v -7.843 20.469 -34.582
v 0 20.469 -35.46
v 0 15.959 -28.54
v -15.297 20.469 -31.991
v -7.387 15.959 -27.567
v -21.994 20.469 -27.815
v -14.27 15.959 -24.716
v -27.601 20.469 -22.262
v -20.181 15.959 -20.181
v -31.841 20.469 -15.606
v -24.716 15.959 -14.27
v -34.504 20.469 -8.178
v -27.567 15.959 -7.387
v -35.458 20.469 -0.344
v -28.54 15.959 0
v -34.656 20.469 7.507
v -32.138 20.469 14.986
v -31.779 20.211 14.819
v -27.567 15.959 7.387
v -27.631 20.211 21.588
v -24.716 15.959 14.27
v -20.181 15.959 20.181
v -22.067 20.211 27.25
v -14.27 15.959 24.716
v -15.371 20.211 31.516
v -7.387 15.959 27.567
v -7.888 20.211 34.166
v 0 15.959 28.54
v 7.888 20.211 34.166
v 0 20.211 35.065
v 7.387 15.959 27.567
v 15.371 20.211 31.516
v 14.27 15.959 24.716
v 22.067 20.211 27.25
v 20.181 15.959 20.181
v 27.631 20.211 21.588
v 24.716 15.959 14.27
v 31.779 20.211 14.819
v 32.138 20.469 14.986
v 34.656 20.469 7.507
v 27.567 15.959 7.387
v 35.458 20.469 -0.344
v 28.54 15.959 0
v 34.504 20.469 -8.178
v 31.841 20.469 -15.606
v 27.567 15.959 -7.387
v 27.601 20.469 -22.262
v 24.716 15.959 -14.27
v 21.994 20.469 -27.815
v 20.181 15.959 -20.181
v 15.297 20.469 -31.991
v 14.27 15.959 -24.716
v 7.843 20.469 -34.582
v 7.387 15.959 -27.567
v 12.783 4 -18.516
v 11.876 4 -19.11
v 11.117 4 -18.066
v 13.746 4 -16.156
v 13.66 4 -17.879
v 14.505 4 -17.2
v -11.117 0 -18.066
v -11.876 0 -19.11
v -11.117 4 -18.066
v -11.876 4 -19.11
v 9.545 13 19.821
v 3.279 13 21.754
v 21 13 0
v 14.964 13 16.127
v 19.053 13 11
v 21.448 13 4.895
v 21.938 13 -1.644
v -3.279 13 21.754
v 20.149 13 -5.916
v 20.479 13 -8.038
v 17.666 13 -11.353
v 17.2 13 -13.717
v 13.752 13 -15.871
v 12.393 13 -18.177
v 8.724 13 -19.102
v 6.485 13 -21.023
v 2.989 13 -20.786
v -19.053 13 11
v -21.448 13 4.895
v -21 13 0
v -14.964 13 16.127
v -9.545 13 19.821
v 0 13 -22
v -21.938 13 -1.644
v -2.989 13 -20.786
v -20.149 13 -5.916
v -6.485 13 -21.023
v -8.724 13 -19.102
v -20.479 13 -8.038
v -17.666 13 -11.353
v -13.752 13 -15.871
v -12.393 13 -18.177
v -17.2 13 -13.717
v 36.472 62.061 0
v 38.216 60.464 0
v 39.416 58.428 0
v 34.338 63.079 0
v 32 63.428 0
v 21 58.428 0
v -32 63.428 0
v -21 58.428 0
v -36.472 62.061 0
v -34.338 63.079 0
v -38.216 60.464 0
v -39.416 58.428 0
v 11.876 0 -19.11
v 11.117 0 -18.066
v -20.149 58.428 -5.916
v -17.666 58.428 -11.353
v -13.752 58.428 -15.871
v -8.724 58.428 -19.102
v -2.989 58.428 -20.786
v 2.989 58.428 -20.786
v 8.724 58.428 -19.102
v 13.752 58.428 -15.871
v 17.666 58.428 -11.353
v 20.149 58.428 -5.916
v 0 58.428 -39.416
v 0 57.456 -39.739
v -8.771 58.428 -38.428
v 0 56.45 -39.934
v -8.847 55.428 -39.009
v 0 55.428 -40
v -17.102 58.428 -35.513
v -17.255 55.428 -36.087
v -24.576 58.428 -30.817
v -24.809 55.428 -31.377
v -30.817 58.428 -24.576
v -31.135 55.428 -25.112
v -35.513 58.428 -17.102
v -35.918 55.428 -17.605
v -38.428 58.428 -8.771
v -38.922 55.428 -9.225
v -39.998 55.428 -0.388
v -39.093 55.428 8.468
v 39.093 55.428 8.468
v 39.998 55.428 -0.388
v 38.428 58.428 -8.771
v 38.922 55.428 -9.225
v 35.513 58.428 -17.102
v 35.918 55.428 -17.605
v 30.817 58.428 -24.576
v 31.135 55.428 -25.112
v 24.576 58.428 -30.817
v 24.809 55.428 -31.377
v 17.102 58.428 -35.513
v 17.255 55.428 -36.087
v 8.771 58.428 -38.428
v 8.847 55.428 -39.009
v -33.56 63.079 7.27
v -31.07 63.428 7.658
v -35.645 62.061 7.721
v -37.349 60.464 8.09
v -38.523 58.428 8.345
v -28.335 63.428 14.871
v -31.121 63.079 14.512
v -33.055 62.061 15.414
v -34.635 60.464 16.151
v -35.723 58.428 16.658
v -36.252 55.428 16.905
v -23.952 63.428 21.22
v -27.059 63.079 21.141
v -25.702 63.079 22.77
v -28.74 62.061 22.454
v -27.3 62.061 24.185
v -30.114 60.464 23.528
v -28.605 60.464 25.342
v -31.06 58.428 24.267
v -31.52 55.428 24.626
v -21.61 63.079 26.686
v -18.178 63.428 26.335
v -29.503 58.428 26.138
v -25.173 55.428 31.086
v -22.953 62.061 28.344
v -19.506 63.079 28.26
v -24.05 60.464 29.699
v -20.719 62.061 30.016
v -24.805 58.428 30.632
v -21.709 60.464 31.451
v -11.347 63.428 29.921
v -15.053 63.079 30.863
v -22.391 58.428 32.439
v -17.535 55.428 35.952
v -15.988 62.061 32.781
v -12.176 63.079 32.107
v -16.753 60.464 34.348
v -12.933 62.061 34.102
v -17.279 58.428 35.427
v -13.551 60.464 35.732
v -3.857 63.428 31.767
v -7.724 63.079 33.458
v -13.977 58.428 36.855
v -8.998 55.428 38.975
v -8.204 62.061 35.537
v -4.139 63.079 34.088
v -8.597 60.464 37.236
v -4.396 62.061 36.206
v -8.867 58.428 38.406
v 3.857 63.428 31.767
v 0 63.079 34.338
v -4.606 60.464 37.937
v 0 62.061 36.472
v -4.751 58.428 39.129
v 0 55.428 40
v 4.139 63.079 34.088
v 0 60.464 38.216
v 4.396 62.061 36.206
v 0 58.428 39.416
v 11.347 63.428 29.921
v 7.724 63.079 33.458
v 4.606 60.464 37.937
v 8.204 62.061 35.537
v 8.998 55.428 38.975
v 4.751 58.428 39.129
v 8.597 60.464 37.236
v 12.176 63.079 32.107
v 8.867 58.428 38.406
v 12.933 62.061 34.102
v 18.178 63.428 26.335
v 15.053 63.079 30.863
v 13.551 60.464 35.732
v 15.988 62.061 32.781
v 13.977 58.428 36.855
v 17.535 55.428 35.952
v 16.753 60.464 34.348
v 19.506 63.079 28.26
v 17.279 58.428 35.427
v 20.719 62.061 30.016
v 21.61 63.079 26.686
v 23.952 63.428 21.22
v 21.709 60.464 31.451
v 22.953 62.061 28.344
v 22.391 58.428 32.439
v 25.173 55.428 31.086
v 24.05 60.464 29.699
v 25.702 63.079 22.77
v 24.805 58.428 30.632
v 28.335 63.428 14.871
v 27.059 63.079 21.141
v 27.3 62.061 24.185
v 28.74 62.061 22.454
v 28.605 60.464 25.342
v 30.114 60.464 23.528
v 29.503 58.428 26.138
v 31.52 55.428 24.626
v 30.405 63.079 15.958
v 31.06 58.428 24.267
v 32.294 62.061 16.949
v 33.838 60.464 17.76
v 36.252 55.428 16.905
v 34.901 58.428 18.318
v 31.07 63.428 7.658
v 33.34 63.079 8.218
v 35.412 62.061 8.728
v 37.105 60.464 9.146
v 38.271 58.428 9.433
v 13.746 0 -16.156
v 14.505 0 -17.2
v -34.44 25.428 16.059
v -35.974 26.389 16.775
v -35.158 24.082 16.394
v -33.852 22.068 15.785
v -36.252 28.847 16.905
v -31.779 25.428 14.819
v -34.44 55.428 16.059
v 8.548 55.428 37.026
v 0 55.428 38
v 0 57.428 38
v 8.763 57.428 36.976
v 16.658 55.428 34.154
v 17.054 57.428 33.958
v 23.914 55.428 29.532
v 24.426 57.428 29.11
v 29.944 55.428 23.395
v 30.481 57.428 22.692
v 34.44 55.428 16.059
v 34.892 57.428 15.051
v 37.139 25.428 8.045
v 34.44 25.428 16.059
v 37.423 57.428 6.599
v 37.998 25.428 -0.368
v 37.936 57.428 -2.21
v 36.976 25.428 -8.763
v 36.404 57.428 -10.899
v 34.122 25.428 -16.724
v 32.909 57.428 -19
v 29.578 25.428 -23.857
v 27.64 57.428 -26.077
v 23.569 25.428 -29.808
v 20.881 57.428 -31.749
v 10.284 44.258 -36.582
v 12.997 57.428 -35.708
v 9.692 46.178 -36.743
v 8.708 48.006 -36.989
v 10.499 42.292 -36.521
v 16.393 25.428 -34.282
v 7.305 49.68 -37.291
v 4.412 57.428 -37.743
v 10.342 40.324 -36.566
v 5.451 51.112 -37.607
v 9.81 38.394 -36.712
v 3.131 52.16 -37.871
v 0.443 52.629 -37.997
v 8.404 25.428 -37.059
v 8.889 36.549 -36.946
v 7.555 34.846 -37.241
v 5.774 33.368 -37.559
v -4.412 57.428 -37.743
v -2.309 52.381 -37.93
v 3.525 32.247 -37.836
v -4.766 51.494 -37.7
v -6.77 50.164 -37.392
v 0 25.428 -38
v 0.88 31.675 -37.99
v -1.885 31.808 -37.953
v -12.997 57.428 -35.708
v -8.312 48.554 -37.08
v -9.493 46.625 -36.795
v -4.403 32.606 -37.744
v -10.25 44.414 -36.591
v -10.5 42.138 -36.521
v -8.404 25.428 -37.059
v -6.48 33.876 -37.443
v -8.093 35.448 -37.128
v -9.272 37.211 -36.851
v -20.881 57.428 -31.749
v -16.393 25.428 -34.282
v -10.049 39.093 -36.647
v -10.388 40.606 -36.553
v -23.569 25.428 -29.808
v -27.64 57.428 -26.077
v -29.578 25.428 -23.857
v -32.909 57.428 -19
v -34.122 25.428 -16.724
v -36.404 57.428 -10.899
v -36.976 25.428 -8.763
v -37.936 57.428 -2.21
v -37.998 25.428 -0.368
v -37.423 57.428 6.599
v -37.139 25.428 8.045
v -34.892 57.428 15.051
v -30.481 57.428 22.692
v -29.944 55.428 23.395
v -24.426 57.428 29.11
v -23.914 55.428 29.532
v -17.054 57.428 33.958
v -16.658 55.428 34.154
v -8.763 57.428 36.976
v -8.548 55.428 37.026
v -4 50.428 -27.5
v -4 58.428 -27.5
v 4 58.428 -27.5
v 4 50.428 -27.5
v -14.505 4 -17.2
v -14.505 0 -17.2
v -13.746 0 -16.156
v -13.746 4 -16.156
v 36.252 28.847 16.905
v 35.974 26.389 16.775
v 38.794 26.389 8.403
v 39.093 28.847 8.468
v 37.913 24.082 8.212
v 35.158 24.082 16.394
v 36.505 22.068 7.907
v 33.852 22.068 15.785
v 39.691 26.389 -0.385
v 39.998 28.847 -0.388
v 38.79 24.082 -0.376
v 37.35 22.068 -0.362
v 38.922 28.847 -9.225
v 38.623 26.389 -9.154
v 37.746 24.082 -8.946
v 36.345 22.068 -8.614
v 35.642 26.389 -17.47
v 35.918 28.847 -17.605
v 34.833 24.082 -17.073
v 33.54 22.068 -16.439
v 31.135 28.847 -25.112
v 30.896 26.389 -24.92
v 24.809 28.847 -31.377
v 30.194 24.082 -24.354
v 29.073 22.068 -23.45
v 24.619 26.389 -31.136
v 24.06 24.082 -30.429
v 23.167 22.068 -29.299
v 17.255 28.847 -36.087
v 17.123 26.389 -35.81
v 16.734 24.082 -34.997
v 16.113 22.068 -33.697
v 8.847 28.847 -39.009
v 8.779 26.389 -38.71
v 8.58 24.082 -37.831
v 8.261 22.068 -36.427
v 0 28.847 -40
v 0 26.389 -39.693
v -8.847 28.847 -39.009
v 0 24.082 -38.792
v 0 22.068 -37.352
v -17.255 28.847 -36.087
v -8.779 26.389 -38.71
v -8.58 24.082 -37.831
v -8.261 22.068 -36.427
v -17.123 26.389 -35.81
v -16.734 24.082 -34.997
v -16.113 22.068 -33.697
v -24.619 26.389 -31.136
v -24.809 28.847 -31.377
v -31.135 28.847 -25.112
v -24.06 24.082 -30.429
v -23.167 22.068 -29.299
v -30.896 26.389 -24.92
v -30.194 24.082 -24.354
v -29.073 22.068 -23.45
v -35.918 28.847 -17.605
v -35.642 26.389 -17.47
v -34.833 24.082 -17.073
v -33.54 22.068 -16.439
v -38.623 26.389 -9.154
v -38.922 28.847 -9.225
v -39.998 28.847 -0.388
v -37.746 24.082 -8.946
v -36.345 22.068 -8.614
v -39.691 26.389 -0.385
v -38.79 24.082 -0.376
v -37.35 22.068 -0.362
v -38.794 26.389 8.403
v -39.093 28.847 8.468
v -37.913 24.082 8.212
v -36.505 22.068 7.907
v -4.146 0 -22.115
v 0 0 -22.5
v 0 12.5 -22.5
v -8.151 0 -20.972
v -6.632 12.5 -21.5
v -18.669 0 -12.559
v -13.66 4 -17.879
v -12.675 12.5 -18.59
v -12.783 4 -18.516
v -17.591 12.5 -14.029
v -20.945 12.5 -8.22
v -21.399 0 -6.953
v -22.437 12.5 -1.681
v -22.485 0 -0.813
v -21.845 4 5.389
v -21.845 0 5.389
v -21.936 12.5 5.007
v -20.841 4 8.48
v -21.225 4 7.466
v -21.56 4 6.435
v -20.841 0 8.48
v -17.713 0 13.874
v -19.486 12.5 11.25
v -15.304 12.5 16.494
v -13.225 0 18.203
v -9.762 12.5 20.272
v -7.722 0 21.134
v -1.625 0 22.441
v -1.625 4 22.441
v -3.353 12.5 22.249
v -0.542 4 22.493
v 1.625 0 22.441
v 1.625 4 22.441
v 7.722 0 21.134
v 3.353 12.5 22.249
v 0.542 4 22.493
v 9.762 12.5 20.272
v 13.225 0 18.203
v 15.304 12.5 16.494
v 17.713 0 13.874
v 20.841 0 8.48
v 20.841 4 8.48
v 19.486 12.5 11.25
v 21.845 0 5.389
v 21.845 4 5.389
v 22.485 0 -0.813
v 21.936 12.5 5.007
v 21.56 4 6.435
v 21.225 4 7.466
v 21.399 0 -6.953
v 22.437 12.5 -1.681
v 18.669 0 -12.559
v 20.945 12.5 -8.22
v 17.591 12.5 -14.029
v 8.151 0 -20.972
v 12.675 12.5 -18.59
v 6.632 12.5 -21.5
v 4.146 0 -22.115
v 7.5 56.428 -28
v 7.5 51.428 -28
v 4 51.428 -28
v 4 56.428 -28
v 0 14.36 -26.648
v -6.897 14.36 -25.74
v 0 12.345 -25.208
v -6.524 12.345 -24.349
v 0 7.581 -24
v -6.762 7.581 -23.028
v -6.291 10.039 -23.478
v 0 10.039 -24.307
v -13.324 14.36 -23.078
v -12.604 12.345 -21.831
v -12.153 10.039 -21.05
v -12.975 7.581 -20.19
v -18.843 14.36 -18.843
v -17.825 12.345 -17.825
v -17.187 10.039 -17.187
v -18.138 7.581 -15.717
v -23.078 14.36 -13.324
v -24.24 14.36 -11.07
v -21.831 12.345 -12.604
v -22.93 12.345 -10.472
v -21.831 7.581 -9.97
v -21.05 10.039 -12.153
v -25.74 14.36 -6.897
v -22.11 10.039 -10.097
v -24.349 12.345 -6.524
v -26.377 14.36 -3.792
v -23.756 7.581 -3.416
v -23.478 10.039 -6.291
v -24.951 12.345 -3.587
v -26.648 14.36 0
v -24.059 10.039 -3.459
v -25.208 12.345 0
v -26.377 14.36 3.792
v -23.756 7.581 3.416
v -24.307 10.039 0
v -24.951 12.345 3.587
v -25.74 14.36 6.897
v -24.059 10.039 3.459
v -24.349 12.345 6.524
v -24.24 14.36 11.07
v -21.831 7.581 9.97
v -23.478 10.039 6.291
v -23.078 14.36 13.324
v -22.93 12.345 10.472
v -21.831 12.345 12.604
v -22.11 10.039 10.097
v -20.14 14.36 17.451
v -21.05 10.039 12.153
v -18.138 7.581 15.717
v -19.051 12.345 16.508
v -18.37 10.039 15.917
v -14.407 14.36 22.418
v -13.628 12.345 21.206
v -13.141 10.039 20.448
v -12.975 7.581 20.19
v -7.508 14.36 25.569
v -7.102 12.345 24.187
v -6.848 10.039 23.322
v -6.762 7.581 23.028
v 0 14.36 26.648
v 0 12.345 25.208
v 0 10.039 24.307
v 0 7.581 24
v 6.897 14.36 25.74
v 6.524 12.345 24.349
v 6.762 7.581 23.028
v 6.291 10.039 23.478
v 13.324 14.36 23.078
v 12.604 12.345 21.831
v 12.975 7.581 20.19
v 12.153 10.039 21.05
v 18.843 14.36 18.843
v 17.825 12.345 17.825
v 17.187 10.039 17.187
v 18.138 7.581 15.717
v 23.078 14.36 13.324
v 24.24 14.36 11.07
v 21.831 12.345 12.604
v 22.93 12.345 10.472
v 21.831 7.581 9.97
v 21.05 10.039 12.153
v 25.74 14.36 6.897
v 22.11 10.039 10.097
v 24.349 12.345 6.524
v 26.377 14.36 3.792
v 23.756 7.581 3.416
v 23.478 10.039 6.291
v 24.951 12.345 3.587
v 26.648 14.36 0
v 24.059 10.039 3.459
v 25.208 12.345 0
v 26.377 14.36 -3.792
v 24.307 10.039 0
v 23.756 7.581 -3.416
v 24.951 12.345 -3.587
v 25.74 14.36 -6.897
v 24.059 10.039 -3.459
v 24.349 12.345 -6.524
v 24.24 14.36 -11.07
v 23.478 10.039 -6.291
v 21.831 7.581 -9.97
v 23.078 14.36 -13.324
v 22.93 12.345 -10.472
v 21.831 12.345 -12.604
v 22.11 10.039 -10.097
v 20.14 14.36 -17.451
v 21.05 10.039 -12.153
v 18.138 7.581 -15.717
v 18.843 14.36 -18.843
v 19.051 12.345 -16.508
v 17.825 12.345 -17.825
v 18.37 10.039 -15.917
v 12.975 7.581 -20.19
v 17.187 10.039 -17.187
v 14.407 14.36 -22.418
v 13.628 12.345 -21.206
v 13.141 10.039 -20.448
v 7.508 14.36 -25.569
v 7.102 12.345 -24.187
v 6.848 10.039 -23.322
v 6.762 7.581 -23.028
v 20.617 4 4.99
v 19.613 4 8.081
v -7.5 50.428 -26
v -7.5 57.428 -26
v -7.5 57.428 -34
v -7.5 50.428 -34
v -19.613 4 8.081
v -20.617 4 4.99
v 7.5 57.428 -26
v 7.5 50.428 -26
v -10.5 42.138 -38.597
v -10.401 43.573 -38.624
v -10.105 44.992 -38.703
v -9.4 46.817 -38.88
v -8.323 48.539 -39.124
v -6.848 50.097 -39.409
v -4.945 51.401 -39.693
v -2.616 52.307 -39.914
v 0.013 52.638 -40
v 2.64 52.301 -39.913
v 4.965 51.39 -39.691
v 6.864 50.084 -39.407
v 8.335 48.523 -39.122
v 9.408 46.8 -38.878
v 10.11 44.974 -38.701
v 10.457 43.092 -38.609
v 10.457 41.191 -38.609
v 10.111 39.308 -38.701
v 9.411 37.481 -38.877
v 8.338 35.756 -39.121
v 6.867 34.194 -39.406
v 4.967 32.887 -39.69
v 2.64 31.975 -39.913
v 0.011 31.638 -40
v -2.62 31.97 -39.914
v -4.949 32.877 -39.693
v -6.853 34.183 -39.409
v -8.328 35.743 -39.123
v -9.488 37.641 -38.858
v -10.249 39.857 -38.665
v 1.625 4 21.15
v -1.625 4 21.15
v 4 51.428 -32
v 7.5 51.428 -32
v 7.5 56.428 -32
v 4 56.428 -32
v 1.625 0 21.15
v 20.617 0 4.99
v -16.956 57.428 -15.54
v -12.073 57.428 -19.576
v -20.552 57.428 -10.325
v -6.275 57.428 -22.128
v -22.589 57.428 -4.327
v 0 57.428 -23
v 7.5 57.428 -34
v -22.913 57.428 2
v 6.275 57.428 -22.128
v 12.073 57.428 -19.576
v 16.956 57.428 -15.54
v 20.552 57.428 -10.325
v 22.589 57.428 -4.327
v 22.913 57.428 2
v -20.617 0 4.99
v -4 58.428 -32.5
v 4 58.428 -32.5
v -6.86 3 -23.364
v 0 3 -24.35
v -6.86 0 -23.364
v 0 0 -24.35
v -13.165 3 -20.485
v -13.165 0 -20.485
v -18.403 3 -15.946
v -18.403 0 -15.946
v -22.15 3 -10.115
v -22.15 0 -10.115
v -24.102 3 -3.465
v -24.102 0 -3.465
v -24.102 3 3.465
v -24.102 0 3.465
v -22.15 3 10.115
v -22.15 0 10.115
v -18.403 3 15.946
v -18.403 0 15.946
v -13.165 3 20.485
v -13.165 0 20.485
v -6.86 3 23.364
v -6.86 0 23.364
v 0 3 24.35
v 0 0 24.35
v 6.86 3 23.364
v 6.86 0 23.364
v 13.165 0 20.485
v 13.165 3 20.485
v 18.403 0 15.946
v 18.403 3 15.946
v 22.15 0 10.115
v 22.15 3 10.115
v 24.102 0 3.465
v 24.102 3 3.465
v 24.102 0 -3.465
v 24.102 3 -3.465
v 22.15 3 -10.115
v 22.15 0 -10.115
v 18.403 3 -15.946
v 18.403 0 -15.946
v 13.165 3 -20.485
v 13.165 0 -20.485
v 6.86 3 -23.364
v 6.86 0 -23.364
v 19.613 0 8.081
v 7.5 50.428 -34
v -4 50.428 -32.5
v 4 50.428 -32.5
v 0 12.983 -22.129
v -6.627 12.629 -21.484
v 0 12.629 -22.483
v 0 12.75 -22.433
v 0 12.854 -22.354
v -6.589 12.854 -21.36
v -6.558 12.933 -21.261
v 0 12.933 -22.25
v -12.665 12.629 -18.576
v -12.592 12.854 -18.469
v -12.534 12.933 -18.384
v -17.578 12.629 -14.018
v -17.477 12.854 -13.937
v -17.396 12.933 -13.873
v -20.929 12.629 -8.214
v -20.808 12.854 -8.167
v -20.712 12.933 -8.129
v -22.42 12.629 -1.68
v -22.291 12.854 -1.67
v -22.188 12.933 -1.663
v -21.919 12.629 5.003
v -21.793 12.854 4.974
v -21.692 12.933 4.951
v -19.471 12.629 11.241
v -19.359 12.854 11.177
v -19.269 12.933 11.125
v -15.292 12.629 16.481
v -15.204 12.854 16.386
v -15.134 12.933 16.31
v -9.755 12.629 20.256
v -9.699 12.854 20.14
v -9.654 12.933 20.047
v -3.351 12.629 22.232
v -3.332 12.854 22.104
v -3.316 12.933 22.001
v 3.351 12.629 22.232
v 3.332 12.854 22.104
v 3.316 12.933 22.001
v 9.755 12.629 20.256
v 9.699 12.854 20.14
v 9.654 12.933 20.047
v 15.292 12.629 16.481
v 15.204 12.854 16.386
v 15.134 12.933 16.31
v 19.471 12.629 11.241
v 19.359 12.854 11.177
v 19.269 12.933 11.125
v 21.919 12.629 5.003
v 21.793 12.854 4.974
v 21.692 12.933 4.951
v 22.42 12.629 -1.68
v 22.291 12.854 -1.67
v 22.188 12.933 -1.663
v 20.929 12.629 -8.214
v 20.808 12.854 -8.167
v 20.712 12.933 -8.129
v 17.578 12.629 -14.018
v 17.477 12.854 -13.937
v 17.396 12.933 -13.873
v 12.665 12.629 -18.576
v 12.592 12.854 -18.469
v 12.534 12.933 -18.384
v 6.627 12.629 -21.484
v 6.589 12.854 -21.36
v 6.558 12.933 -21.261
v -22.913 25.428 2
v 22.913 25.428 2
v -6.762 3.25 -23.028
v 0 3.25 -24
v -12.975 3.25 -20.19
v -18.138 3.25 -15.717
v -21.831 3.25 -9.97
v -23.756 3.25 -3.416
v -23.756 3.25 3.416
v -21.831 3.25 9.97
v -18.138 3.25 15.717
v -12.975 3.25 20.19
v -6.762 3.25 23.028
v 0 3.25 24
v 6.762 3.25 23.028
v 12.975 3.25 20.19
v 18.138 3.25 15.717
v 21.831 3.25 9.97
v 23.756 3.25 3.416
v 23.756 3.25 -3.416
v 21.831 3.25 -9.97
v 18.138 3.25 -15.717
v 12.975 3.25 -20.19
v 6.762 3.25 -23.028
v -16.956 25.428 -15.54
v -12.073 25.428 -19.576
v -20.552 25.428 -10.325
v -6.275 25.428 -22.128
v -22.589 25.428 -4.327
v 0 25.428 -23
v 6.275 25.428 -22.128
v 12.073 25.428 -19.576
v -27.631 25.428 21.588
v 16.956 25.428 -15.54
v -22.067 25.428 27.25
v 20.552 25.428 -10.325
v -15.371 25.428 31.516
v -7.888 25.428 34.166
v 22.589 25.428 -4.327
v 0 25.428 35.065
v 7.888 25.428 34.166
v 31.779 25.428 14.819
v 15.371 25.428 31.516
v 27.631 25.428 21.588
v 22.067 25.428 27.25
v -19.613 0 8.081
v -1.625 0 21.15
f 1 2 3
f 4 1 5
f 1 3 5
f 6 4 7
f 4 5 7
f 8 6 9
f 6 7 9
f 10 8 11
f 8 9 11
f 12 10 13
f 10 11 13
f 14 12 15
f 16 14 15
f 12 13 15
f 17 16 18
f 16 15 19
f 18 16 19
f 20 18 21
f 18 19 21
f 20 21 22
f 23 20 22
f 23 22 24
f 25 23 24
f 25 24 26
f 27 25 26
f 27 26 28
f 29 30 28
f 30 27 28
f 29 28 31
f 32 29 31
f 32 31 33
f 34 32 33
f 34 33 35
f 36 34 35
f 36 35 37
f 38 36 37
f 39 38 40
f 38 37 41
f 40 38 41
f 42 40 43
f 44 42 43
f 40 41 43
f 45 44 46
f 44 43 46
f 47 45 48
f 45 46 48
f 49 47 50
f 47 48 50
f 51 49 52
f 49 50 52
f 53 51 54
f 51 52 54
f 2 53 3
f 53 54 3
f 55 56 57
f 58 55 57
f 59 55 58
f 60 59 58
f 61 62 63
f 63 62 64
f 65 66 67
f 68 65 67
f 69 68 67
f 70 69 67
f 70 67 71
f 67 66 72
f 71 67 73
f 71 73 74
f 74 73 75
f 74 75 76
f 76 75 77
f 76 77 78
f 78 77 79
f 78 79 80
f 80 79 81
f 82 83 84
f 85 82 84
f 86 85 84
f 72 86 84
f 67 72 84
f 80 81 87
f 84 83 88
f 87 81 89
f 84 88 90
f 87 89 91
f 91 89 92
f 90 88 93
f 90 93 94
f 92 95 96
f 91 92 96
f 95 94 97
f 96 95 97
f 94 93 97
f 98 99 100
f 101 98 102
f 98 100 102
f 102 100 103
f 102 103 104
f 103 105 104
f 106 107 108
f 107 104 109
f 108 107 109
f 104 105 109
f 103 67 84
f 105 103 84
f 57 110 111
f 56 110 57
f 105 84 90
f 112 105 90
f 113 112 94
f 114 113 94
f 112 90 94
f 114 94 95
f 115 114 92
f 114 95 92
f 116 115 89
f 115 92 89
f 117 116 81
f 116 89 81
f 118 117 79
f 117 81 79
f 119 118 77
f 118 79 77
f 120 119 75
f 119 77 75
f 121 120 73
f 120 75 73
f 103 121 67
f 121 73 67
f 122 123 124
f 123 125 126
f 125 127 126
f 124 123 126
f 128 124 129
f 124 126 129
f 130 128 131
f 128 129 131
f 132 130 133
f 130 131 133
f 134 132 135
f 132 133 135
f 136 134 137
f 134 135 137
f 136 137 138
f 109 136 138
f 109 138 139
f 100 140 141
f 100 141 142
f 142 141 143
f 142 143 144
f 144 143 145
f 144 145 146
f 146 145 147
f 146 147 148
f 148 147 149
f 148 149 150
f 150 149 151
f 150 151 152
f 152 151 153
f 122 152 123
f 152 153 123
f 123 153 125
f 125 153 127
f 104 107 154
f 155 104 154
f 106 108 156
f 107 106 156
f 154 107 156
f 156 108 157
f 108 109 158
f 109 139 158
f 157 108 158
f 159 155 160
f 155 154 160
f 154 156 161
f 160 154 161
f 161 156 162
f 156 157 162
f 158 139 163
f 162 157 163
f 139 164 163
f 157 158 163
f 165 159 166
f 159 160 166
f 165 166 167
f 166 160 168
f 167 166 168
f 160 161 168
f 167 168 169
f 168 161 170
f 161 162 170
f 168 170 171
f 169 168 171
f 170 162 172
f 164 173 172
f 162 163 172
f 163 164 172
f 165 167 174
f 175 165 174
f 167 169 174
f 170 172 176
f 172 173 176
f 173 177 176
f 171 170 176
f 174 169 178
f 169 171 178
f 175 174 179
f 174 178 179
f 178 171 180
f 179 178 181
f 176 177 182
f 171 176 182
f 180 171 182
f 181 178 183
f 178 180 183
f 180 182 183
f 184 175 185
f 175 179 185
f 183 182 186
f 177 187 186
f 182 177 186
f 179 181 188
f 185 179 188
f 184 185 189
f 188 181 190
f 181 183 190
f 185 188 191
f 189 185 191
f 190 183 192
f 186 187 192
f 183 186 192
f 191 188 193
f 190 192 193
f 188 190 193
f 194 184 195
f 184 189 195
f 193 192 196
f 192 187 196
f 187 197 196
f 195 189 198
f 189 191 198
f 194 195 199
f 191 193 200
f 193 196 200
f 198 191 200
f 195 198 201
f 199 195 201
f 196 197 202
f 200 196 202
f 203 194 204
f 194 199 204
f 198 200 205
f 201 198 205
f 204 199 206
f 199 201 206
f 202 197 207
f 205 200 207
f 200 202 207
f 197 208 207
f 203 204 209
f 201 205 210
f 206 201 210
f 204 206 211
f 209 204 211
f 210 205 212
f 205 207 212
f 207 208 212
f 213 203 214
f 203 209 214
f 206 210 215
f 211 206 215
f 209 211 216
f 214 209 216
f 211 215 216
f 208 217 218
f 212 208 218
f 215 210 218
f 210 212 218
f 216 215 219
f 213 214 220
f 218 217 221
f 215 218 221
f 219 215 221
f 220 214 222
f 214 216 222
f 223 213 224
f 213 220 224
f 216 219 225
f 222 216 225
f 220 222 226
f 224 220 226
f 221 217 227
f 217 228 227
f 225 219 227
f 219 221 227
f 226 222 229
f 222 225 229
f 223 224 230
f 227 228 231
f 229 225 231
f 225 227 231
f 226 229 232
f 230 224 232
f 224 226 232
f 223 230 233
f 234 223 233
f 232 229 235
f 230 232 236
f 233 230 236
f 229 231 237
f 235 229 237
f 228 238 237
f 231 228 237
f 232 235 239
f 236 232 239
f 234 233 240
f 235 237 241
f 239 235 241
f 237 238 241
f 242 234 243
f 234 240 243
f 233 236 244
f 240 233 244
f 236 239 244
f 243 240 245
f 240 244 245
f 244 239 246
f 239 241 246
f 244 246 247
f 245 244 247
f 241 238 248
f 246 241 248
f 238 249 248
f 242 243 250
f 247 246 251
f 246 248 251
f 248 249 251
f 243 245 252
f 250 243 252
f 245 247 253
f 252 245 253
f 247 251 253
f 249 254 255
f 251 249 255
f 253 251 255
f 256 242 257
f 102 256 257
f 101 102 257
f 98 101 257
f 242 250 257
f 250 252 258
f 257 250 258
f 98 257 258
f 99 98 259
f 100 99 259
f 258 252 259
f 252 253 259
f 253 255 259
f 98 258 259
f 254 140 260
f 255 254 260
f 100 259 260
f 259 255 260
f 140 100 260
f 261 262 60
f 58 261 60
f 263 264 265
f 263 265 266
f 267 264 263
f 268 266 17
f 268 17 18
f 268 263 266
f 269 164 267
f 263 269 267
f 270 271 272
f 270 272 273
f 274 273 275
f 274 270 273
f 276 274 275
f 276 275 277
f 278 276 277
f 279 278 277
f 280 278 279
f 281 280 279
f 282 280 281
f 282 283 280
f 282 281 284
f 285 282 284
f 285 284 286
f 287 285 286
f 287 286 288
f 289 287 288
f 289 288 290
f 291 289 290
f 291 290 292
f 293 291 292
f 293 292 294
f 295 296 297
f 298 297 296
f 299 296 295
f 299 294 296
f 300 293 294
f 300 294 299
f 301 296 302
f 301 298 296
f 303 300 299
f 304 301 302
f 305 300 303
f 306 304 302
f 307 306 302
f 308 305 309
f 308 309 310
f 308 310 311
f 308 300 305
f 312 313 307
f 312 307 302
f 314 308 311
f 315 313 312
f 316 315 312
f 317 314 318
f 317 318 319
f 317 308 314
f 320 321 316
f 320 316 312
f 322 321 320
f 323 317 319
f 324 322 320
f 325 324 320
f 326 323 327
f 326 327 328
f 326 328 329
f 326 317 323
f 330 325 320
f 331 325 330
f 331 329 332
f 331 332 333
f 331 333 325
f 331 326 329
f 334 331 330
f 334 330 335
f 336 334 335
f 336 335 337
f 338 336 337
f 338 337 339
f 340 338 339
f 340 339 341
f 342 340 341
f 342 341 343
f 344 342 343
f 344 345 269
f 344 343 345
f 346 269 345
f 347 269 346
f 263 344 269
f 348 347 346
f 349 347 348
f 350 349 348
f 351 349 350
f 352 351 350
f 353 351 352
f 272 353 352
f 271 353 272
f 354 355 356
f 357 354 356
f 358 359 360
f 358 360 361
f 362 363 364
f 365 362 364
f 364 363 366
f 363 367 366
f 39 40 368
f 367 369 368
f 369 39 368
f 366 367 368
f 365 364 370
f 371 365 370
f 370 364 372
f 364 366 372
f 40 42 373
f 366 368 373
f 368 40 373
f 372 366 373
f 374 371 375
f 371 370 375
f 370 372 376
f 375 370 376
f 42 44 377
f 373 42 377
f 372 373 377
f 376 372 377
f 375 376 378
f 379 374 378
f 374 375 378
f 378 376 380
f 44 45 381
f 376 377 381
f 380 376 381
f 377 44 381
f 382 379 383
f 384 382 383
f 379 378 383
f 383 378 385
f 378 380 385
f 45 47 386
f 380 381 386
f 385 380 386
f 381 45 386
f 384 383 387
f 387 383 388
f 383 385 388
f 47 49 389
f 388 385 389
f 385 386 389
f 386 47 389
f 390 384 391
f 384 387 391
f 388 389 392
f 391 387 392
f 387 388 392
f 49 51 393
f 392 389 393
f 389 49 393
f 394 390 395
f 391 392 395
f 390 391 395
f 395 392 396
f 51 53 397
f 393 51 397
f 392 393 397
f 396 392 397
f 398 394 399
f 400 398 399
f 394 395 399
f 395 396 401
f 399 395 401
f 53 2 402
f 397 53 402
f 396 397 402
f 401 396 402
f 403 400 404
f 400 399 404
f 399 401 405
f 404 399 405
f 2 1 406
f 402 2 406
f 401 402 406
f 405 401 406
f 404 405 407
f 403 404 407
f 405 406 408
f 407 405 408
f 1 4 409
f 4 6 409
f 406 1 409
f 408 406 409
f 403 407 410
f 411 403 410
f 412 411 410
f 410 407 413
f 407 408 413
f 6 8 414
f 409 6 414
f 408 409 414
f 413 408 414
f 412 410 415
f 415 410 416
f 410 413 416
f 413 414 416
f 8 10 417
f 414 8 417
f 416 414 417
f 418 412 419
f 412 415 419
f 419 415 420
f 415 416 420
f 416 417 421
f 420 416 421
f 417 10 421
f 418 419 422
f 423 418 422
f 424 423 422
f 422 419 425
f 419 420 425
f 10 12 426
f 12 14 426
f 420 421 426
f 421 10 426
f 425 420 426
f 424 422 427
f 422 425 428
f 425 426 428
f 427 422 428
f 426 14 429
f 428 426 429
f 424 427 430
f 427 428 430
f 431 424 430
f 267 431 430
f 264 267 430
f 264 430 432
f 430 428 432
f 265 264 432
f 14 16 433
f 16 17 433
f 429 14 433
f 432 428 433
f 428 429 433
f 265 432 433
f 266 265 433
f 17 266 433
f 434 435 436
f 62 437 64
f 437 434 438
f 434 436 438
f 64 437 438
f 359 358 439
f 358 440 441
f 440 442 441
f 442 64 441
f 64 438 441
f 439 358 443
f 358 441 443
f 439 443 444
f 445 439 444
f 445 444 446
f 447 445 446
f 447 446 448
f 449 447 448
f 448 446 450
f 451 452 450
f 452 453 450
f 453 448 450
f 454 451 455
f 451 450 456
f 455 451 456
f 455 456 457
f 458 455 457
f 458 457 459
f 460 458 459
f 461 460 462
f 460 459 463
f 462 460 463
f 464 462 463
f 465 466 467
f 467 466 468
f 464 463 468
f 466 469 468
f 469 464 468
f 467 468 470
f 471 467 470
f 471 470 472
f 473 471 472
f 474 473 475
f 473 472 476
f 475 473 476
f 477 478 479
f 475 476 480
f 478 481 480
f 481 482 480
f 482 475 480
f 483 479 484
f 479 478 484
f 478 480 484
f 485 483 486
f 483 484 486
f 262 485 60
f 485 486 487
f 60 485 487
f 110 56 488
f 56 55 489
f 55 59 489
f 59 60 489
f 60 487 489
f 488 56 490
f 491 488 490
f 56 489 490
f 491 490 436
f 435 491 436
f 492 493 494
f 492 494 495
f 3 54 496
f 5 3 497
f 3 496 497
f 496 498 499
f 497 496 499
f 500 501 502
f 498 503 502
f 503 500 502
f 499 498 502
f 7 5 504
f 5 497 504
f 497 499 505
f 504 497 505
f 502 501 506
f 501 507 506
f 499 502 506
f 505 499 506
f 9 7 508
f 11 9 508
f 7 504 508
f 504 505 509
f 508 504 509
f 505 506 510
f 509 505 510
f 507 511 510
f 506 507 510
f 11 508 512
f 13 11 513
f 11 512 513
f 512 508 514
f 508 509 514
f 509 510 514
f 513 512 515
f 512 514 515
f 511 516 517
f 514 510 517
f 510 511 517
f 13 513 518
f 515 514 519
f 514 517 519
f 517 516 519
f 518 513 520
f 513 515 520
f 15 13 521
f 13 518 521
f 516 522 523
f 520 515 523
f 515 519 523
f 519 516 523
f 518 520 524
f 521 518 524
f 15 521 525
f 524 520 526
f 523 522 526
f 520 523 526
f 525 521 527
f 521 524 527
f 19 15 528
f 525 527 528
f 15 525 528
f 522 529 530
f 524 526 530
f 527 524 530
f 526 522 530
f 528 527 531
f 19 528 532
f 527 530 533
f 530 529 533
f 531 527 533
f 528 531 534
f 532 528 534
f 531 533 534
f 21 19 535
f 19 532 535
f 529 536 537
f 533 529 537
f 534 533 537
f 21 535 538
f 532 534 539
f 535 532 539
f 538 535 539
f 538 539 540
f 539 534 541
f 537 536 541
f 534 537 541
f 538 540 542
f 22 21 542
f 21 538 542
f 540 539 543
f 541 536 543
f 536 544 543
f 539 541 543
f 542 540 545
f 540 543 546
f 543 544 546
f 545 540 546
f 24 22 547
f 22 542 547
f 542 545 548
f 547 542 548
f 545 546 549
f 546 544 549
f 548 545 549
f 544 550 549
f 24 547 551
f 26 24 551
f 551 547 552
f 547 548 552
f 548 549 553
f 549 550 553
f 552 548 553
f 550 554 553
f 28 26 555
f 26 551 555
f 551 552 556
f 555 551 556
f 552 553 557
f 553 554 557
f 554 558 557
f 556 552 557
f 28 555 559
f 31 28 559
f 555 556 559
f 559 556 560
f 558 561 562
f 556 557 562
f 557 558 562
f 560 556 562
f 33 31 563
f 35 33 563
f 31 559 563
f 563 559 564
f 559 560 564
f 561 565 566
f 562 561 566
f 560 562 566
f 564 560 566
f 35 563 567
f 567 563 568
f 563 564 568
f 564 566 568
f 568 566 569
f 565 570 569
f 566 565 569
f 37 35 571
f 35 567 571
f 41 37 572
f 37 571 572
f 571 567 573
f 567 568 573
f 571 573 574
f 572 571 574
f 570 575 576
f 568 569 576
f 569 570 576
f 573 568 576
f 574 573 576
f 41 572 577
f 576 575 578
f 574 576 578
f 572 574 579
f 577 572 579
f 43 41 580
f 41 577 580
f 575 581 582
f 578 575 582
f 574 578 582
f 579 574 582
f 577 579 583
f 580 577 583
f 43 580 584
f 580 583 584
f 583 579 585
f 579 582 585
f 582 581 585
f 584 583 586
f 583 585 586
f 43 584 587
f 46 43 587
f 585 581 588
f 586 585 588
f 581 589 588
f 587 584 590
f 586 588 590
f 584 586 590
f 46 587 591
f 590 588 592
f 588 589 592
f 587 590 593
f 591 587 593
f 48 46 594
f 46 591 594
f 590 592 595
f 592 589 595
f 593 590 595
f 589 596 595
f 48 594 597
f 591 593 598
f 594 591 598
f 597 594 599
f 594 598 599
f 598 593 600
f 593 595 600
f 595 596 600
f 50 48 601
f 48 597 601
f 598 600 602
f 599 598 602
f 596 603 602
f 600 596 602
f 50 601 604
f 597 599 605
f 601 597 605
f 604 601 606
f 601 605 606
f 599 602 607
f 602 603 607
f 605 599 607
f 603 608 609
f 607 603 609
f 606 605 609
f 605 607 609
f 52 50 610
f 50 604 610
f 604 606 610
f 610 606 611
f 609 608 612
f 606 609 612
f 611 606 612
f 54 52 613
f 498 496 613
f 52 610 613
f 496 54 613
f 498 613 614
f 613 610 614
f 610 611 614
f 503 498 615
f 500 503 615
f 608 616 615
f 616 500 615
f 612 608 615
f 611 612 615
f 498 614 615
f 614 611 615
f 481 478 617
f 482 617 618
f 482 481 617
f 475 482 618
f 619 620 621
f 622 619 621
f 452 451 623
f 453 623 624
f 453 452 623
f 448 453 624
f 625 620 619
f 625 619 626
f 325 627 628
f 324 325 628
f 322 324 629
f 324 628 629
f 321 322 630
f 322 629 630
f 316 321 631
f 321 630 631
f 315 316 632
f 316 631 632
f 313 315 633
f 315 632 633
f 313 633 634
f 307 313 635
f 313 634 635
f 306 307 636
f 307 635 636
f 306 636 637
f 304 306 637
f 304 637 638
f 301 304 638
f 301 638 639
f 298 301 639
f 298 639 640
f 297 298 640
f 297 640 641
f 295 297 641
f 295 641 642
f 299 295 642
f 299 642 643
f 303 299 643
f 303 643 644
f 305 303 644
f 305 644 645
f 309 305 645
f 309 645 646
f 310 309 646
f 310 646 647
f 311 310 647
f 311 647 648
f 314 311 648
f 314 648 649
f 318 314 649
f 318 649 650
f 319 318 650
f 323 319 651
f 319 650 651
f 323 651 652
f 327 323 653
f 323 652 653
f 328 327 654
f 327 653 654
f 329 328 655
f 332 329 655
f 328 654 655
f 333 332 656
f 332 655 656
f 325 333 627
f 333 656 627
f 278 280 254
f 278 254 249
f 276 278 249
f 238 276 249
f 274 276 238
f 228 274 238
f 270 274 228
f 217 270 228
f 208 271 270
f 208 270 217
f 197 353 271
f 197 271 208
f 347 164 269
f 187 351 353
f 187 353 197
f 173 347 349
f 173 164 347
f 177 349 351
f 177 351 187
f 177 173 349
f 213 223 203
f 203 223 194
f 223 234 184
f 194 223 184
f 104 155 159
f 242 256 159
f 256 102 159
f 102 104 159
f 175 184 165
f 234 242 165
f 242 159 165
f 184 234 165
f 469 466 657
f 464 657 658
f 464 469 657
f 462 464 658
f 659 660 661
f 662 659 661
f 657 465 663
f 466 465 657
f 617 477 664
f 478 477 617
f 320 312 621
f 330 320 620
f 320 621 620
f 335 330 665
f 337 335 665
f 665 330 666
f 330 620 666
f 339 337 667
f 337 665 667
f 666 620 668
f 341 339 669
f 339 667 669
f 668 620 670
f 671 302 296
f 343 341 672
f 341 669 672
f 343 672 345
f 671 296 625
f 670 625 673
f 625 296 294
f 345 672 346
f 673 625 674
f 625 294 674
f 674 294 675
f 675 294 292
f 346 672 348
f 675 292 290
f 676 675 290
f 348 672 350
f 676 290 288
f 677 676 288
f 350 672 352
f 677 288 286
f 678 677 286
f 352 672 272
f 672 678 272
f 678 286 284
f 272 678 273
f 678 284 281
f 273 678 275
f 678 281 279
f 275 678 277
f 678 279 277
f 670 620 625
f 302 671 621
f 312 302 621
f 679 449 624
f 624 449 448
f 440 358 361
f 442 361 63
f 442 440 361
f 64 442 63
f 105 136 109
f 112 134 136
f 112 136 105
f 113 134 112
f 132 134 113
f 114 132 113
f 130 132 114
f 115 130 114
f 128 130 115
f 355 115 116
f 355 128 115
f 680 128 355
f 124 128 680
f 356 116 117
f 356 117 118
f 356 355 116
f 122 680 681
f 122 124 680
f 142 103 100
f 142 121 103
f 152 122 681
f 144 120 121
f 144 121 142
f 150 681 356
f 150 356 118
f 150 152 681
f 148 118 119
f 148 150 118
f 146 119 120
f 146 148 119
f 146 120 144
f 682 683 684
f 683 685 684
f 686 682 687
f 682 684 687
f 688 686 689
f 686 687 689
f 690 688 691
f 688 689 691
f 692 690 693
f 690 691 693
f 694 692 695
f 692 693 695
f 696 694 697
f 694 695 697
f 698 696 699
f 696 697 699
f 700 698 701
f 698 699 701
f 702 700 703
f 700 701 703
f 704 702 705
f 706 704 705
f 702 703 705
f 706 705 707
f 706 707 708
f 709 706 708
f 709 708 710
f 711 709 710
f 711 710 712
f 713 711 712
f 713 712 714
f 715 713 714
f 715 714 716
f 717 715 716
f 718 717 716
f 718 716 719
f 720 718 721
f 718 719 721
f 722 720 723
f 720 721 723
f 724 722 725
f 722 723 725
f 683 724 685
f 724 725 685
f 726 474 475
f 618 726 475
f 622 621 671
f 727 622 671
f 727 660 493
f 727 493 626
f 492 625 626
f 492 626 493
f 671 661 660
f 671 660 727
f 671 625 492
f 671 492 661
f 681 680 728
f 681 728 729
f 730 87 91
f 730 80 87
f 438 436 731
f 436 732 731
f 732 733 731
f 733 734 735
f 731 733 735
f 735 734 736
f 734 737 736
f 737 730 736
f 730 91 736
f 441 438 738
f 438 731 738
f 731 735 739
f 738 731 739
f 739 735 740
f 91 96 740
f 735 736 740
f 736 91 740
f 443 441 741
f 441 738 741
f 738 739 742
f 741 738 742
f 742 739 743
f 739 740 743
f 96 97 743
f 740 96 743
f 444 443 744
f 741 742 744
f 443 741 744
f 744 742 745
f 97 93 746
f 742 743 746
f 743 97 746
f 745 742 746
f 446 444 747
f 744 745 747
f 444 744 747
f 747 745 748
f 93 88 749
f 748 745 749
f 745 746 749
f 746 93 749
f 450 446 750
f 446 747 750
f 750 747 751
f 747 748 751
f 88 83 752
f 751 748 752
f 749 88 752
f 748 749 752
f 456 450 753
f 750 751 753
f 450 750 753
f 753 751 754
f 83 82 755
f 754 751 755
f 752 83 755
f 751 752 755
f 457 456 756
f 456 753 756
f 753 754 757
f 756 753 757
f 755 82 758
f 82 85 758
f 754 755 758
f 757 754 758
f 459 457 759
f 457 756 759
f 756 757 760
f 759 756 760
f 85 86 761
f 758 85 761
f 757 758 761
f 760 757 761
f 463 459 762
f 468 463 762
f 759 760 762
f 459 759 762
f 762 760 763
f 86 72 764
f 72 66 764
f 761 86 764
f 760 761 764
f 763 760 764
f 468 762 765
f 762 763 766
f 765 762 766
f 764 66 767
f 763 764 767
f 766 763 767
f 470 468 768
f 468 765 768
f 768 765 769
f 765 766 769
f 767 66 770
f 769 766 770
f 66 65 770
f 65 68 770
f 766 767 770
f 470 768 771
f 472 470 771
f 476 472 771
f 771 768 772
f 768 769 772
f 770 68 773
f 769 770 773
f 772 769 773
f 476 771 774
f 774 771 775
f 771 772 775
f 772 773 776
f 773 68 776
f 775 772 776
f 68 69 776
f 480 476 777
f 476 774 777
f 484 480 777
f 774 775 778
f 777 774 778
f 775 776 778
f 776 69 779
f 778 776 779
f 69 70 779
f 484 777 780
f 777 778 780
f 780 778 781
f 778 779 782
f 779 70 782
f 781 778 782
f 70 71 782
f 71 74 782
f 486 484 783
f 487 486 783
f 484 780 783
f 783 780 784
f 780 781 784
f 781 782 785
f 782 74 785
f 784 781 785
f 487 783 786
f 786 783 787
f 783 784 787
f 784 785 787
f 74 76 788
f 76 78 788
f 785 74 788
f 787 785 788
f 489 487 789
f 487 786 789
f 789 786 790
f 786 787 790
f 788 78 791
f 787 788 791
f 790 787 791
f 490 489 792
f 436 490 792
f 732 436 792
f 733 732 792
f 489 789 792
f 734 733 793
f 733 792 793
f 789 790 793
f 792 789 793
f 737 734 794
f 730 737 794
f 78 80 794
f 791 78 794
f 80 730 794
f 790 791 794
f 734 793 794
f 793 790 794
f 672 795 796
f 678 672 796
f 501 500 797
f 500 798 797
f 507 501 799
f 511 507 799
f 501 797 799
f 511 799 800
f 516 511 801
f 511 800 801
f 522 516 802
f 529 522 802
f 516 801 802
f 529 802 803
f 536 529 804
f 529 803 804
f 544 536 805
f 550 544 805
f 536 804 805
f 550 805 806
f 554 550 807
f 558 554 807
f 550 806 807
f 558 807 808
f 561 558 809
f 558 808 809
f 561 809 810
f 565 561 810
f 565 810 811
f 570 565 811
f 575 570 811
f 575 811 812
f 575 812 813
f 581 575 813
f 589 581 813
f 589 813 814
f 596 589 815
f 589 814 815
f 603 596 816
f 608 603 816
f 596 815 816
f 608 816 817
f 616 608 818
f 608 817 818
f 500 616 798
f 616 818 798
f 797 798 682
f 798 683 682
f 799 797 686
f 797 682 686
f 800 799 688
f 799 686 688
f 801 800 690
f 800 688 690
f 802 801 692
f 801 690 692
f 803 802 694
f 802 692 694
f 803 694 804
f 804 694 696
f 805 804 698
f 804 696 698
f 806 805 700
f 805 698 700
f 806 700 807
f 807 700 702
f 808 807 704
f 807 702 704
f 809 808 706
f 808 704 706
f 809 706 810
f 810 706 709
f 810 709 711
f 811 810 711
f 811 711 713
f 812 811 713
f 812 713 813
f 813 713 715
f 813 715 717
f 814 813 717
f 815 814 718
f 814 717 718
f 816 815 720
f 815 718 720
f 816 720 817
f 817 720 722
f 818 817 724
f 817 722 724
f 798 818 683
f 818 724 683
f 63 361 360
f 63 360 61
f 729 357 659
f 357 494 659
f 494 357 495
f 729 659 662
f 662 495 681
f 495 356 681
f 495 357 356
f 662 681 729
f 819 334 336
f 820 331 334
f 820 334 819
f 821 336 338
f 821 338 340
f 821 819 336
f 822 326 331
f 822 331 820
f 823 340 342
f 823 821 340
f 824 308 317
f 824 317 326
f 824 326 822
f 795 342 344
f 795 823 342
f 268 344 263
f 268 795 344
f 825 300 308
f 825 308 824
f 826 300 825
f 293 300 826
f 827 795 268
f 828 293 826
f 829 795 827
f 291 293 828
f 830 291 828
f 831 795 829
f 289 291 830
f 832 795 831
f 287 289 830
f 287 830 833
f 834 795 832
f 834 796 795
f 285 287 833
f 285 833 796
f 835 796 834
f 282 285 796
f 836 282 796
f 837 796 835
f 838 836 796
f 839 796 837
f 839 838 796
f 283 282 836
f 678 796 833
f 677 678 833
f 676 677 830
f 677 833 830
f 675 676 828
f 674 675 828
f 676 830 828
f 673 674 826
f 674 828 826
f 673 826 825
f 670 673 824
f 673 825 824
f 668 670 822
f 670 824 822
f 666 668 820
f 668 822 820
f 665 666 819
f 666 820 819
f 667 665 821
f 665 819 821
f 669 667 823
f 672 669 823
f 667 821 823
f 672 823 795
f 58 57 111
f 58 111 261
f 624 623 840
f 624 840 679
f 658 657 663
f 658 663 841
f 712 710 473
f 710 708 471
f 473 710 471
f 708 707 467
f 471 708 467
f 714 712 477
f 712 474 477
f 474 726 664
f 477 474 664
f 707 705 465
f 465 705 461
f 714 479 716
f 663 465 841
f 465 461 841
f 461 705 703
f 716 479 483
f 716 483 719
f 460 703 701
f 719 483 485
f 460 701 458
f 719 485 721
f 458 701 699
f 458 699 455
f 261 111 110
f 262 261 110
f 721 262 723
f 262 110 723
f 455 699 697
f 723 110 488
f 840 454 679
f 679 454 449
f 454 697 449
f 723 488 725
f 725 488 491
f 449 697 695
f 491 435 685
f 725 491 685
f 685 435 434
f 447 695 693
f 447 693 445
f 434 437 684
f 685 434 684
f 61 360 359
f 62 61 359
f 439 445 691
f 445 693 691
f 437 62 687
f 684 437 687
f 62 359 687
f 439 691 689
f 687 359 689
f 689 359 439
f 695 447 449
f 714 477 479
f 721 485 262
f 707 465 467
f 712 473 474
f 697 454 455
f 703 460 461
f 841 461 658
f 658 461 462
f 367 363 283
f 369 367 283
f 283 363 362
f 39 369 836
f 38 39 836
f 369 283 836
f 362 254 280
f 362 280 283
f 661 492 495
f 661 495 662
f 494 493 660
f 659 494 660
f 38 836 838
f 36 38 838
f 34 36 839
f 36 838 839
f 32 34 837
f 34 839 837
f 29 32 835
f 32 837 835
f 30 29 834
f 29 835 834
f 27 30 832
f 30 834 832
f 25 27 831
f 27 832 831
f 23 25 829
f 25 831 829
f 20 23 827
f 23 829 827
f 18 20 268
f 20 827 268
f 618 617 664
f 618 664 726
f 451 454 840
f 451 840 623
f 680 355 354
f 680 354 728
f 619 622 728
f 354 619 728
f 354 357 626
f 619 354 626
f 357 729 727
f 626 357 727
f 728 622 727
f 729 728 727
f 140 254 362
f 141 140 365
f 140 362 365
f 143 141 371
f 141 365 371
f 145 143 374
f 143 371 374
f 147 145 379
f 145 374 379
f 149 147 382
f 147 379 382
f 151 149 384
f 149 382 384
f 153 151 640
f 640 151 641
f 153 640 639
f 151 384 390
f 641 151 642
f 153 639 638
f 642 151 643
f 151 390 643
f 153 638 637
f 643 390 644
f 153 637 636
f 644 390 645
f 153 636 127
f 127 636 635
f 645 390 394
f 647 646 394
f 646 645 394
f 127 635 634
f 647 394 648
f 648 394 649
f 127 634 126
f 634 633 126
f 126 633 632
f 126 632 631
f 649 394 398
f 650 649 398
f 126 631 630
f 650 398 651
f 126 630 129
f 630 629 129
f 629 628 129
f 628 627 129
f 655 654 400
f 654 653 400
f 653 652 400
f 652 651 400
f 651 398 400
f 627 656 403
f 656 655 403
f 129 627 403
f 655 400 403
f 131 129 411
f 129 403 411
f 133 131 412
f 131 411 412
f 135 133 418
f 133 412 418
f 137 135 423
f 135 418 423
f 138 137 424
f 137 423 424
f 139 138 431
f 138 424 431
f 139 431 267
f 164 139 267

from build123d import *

# Parameters (mm, degrees)
CUT_EXTRUDE3_DEPTH           = 60
CUT_EXTRUDE5_DEPTH           = 2
CUT_EXTRUDE5_DEPTH_BACK      = 30
SKETCH9_R                    = 38
SKETCH9_R_2                  = 23
SKETCH19_W                   = 12
SKETCH19_H                   = 36.5
CUT_REVOLVE2_ANGLE           = 65
CUT_REVOLVE2_OTHER_WAY_ANGLE = 65
SKETCH21_W                   = 3.25
SKETCH21_H                   = 4
BOSS_EXTRUDE3_DEPTH          = 1.35
CIRPATTERN1_COUNT            = 5
CUT_EXTRUDE9_START           = -5
CUT_EXTRUDE9_DEPTH           = 5
SKETCH23_R                   = 10.5
CUT_EXTRUDE10_DEPTH          = 10
SKETCH24_W                   = 15
SKETCH24_H                   = 8
BOSS_EXTRUDE4_DEPTH          = 8
SKETCH26_W                   = 8
SKETCH26_H                   = 5
CUT_EXTRUDE11_DEPTH          = 10
SKETCH27_W                   = 4
SKETCH27_H                   = 5
CUT_EXTRUDE12_DEPTH          = 5
CUT_EXTRUDE14_DEPTH          = 2
CUT_EXTRUDE14_DEPTH_BACK     = 30


with BuildPart() as part:
    # Sketch1 → Revolve1 (revolve)
    with BuildSketch(Plane.XY):
        with BuildLine():
            Line((0, 63.427876097), (32, 63.427876097))
            ThreePointArc((32, 63.427876097), (37.656854249, 61.084730346), (40, 55.427876097))
            Line((40, 55.427876097), (40, 28.846818009))
            ThreePointArc((40, 28.846818009), (38.792081772, 24.082439968), (35.460140376, 20.469057744))
            Line((35.460140376, 20.469057744), (28.539859624, 15.958818353))
            ThreePointArc((28.539859624, 15.958818353), (25.207918228, 12.345436129), (24, 7.581058088))
            Line((24, 7.581058088), (24, 3.25))
            Line((24, 3.25), (24.35, 3))
            Line((24.35, 3), (24.35, 0))
            Line((24.35, 0), (22.5, 0))
            Line((22.5, 0), (22.5, 12.5))
            ThreePointArc((22.5, 12.5), (22.353553391, 12.853553391), (22, 13))
            Line((22, 13), (0, 13))
            Line((0, 13), (0, 63.427876097))
        make_face()
    revolve(axis=Axis((0, 0, 0), (0, 1, 0)))

    # Sketch11 → Cut-Extrude3 (cut)
    with BuildSketch(Plane(origin=(0, 13, 0), x_dir=(-1, 0, 0), z_dir=(0, -1, 0))):
        with BuildLine():
            Line((-21, 0), (21, 0))
            ThreePointArc((21, 0), (0, 21), (-21, 0))
        make_face()
    extrude(amount=-CUT_EXTRUDE3_DEPTH, mode=Mode.SUBTRACT)

    # Sketch9 → Cut-Extrude5 (cut, two sides: drawn at the far end of the back side and taken through both)
    with BuildSketch(Plane(origin=(0, 55.427876097, 0), x_dir=(1, 0, 0), z_dir=(0, 1, 0)).offset(-CUT_EXTRUDE5_DEPTH_BACK)):
        Circle(SKETCH9_R)
        Circle(SKETCH9_R_2, mode=Mode.SUBTRACT)
    extrude(amount=CUT_EXTRUDE5_DEPTH + CUT_EXTRUDE5_DEPTH_BACK, mode=Mode.SUBTRACT)

    # Sketch19 → Cut-Revolve2 (revolve, cut)
    with BuildSketch(Plane(origin=(0, 0, 0), x_dir=(0, 0, -1), z_dir=(1, 0, 0))):
        with Locations((-41.064715832, 37.177876097)):
            Rectangle(SKETCH19_W, SKETCH19_H)
    revolve(axis=Axis((0, 0, 0), (0, 1, 0)), revolution_arc=CUT_REVOLVE2_ANGLE, mode=Mode.SUBTRACT)

    # Sketch19 → Cut-Revolve2 other way (revolve, cut)
    with BuildSketch(Plane(origin=(0, 0, 0), x_dir=(0, 0, -1), z_dir=(1, 0, 0))):
        with Locations((-41.064715832, 37.177876097)):
            Rectangle(SKETCH19_W, SKETCH19_H)
    revolve(axis=Axis((0, 0, 0), (0, -1, 0)), revolution_arc=CUT_REVOLVE2_OTHER_WAY_ANGLE, mode=Mode.SUBTRACT)

    # Sketch21 → Boss-Extrude3 (add)
    with BuildSketch(Plane(origin=(0, 0, 22.5), x_dir=(-1, 0, 0), z_dir=(0, 0, -1))):
        with Locations((0, 2)):
            Rectangle(SKETCH21_W, SKETCH21_H)
    boss_extrude3 = extrude(amount=BOSS_EXTRUDE3_DEPTH)

    # CirPattern1: Boss-Extrude3 ×5 about axis
    cirpattern1_axis = Axis((0, 0, 0), (0, -1, 0))
    for i in range(1, CIRPATTERN1_COUNT):
        add(boss_extrude3.rotate(cirpattern1_axis, i * 360 / CIRPATTERN1_COUNT))

    # Sketch22 → Cut-Extrude9 (cut)
    with BuildSketch(Plane(origin=(0, 63.427876097, 0), x_dir=(1, 0, 0), z_dir=(0, 1, 0)).offset(CUT_EXTRUDE9_START)):
        with BuildLine():
            Line((-40, 0), (40, 0))
            ThreePointArc((40, 0), (0, 40), (-40, 0))
        make_face()
    extrude(amount=CUT_EXTRUDE9_DEPTH, mode=Mode.SUBTRACT)

    # Sketch23 → Cut-Extrude10 (cut)
    with BuildSketch(Plane(origin=(0, 0, -40), x_dir=(-1, 0, 0), z_dir=(0, 0, -1))):
        with Locations((0, 42.137876097)):
            Circle(SKETCH23_R)
    extrude(amount=-CUT_EXTRUDE10_DEPTH, mode=Mode.SUBTRACT)

    # Sketch24 → Boss-Extrude4 (add)
    with BuildSketch(Plane(origin=(0, 58.427876097, 0), x_dir=(1, 0, 0), z_dir=(0, 1, 0))):
        with Locations((0, 30)):
            Rectangle(SKETCH24_W, SKETCH24_H)
    extrude(amount=-BOSS_EXTRUDE4_DEPTH)

    # Sketch26 → Cut-Extrude11 (cut)
    with BuildSketch(Plane(origin=(0, 58.427876097, 0), x_dir=(1, 0, 0), z_dir=(0, 1, 0))):
        with Locations((0, 30)):
            Rectangle(SKETCH26_W, SKETCH26_H)
    extrude(amount=-CUT_EXTRUDE11_DEPTH, mode=Mode.SUBTRACT)

    # Sketch27 → Cut-Extrude12 (cut)
    with BuildSketch(Plane(origin=(7.5, 0, 0), x_dir=(0, 0, -1), z_dir=(1, 0, 0))):
        with Locations((30, 53.927876097)):
            Rectangle(SKETCH27_W, SKETCH27_H)
    extrude(amount=-CUT_EXTRUDE12_DEPTH, mode=Mode.SUBTRACT)

    # Sketch28 → Cut-Extrude14 (cut, two sides: drawn at the far end of the back side and taken through both)
    with BuildSketch(Plane(origin=(0, 55.427876097, 0), x_dir=(1, 0, 0), z_dir=(0, 1, 0)).offset(-CUT_EXTRUDE14_DEPTH_BACK)):
        with BuildLine():
            Line((-22.912878475, -2), (22.912878475, -2))
            ThreePointArc((22.912878475, -2), (0, -23), (-22.912878475, -2))
        make_face()
    extrude(amount=CUT_EXTRUDE14_DEPTH + CUT_EXTRUDE14_DEPTH_BACK, mode=Mode.SUBTRACT)


solid = part.part
